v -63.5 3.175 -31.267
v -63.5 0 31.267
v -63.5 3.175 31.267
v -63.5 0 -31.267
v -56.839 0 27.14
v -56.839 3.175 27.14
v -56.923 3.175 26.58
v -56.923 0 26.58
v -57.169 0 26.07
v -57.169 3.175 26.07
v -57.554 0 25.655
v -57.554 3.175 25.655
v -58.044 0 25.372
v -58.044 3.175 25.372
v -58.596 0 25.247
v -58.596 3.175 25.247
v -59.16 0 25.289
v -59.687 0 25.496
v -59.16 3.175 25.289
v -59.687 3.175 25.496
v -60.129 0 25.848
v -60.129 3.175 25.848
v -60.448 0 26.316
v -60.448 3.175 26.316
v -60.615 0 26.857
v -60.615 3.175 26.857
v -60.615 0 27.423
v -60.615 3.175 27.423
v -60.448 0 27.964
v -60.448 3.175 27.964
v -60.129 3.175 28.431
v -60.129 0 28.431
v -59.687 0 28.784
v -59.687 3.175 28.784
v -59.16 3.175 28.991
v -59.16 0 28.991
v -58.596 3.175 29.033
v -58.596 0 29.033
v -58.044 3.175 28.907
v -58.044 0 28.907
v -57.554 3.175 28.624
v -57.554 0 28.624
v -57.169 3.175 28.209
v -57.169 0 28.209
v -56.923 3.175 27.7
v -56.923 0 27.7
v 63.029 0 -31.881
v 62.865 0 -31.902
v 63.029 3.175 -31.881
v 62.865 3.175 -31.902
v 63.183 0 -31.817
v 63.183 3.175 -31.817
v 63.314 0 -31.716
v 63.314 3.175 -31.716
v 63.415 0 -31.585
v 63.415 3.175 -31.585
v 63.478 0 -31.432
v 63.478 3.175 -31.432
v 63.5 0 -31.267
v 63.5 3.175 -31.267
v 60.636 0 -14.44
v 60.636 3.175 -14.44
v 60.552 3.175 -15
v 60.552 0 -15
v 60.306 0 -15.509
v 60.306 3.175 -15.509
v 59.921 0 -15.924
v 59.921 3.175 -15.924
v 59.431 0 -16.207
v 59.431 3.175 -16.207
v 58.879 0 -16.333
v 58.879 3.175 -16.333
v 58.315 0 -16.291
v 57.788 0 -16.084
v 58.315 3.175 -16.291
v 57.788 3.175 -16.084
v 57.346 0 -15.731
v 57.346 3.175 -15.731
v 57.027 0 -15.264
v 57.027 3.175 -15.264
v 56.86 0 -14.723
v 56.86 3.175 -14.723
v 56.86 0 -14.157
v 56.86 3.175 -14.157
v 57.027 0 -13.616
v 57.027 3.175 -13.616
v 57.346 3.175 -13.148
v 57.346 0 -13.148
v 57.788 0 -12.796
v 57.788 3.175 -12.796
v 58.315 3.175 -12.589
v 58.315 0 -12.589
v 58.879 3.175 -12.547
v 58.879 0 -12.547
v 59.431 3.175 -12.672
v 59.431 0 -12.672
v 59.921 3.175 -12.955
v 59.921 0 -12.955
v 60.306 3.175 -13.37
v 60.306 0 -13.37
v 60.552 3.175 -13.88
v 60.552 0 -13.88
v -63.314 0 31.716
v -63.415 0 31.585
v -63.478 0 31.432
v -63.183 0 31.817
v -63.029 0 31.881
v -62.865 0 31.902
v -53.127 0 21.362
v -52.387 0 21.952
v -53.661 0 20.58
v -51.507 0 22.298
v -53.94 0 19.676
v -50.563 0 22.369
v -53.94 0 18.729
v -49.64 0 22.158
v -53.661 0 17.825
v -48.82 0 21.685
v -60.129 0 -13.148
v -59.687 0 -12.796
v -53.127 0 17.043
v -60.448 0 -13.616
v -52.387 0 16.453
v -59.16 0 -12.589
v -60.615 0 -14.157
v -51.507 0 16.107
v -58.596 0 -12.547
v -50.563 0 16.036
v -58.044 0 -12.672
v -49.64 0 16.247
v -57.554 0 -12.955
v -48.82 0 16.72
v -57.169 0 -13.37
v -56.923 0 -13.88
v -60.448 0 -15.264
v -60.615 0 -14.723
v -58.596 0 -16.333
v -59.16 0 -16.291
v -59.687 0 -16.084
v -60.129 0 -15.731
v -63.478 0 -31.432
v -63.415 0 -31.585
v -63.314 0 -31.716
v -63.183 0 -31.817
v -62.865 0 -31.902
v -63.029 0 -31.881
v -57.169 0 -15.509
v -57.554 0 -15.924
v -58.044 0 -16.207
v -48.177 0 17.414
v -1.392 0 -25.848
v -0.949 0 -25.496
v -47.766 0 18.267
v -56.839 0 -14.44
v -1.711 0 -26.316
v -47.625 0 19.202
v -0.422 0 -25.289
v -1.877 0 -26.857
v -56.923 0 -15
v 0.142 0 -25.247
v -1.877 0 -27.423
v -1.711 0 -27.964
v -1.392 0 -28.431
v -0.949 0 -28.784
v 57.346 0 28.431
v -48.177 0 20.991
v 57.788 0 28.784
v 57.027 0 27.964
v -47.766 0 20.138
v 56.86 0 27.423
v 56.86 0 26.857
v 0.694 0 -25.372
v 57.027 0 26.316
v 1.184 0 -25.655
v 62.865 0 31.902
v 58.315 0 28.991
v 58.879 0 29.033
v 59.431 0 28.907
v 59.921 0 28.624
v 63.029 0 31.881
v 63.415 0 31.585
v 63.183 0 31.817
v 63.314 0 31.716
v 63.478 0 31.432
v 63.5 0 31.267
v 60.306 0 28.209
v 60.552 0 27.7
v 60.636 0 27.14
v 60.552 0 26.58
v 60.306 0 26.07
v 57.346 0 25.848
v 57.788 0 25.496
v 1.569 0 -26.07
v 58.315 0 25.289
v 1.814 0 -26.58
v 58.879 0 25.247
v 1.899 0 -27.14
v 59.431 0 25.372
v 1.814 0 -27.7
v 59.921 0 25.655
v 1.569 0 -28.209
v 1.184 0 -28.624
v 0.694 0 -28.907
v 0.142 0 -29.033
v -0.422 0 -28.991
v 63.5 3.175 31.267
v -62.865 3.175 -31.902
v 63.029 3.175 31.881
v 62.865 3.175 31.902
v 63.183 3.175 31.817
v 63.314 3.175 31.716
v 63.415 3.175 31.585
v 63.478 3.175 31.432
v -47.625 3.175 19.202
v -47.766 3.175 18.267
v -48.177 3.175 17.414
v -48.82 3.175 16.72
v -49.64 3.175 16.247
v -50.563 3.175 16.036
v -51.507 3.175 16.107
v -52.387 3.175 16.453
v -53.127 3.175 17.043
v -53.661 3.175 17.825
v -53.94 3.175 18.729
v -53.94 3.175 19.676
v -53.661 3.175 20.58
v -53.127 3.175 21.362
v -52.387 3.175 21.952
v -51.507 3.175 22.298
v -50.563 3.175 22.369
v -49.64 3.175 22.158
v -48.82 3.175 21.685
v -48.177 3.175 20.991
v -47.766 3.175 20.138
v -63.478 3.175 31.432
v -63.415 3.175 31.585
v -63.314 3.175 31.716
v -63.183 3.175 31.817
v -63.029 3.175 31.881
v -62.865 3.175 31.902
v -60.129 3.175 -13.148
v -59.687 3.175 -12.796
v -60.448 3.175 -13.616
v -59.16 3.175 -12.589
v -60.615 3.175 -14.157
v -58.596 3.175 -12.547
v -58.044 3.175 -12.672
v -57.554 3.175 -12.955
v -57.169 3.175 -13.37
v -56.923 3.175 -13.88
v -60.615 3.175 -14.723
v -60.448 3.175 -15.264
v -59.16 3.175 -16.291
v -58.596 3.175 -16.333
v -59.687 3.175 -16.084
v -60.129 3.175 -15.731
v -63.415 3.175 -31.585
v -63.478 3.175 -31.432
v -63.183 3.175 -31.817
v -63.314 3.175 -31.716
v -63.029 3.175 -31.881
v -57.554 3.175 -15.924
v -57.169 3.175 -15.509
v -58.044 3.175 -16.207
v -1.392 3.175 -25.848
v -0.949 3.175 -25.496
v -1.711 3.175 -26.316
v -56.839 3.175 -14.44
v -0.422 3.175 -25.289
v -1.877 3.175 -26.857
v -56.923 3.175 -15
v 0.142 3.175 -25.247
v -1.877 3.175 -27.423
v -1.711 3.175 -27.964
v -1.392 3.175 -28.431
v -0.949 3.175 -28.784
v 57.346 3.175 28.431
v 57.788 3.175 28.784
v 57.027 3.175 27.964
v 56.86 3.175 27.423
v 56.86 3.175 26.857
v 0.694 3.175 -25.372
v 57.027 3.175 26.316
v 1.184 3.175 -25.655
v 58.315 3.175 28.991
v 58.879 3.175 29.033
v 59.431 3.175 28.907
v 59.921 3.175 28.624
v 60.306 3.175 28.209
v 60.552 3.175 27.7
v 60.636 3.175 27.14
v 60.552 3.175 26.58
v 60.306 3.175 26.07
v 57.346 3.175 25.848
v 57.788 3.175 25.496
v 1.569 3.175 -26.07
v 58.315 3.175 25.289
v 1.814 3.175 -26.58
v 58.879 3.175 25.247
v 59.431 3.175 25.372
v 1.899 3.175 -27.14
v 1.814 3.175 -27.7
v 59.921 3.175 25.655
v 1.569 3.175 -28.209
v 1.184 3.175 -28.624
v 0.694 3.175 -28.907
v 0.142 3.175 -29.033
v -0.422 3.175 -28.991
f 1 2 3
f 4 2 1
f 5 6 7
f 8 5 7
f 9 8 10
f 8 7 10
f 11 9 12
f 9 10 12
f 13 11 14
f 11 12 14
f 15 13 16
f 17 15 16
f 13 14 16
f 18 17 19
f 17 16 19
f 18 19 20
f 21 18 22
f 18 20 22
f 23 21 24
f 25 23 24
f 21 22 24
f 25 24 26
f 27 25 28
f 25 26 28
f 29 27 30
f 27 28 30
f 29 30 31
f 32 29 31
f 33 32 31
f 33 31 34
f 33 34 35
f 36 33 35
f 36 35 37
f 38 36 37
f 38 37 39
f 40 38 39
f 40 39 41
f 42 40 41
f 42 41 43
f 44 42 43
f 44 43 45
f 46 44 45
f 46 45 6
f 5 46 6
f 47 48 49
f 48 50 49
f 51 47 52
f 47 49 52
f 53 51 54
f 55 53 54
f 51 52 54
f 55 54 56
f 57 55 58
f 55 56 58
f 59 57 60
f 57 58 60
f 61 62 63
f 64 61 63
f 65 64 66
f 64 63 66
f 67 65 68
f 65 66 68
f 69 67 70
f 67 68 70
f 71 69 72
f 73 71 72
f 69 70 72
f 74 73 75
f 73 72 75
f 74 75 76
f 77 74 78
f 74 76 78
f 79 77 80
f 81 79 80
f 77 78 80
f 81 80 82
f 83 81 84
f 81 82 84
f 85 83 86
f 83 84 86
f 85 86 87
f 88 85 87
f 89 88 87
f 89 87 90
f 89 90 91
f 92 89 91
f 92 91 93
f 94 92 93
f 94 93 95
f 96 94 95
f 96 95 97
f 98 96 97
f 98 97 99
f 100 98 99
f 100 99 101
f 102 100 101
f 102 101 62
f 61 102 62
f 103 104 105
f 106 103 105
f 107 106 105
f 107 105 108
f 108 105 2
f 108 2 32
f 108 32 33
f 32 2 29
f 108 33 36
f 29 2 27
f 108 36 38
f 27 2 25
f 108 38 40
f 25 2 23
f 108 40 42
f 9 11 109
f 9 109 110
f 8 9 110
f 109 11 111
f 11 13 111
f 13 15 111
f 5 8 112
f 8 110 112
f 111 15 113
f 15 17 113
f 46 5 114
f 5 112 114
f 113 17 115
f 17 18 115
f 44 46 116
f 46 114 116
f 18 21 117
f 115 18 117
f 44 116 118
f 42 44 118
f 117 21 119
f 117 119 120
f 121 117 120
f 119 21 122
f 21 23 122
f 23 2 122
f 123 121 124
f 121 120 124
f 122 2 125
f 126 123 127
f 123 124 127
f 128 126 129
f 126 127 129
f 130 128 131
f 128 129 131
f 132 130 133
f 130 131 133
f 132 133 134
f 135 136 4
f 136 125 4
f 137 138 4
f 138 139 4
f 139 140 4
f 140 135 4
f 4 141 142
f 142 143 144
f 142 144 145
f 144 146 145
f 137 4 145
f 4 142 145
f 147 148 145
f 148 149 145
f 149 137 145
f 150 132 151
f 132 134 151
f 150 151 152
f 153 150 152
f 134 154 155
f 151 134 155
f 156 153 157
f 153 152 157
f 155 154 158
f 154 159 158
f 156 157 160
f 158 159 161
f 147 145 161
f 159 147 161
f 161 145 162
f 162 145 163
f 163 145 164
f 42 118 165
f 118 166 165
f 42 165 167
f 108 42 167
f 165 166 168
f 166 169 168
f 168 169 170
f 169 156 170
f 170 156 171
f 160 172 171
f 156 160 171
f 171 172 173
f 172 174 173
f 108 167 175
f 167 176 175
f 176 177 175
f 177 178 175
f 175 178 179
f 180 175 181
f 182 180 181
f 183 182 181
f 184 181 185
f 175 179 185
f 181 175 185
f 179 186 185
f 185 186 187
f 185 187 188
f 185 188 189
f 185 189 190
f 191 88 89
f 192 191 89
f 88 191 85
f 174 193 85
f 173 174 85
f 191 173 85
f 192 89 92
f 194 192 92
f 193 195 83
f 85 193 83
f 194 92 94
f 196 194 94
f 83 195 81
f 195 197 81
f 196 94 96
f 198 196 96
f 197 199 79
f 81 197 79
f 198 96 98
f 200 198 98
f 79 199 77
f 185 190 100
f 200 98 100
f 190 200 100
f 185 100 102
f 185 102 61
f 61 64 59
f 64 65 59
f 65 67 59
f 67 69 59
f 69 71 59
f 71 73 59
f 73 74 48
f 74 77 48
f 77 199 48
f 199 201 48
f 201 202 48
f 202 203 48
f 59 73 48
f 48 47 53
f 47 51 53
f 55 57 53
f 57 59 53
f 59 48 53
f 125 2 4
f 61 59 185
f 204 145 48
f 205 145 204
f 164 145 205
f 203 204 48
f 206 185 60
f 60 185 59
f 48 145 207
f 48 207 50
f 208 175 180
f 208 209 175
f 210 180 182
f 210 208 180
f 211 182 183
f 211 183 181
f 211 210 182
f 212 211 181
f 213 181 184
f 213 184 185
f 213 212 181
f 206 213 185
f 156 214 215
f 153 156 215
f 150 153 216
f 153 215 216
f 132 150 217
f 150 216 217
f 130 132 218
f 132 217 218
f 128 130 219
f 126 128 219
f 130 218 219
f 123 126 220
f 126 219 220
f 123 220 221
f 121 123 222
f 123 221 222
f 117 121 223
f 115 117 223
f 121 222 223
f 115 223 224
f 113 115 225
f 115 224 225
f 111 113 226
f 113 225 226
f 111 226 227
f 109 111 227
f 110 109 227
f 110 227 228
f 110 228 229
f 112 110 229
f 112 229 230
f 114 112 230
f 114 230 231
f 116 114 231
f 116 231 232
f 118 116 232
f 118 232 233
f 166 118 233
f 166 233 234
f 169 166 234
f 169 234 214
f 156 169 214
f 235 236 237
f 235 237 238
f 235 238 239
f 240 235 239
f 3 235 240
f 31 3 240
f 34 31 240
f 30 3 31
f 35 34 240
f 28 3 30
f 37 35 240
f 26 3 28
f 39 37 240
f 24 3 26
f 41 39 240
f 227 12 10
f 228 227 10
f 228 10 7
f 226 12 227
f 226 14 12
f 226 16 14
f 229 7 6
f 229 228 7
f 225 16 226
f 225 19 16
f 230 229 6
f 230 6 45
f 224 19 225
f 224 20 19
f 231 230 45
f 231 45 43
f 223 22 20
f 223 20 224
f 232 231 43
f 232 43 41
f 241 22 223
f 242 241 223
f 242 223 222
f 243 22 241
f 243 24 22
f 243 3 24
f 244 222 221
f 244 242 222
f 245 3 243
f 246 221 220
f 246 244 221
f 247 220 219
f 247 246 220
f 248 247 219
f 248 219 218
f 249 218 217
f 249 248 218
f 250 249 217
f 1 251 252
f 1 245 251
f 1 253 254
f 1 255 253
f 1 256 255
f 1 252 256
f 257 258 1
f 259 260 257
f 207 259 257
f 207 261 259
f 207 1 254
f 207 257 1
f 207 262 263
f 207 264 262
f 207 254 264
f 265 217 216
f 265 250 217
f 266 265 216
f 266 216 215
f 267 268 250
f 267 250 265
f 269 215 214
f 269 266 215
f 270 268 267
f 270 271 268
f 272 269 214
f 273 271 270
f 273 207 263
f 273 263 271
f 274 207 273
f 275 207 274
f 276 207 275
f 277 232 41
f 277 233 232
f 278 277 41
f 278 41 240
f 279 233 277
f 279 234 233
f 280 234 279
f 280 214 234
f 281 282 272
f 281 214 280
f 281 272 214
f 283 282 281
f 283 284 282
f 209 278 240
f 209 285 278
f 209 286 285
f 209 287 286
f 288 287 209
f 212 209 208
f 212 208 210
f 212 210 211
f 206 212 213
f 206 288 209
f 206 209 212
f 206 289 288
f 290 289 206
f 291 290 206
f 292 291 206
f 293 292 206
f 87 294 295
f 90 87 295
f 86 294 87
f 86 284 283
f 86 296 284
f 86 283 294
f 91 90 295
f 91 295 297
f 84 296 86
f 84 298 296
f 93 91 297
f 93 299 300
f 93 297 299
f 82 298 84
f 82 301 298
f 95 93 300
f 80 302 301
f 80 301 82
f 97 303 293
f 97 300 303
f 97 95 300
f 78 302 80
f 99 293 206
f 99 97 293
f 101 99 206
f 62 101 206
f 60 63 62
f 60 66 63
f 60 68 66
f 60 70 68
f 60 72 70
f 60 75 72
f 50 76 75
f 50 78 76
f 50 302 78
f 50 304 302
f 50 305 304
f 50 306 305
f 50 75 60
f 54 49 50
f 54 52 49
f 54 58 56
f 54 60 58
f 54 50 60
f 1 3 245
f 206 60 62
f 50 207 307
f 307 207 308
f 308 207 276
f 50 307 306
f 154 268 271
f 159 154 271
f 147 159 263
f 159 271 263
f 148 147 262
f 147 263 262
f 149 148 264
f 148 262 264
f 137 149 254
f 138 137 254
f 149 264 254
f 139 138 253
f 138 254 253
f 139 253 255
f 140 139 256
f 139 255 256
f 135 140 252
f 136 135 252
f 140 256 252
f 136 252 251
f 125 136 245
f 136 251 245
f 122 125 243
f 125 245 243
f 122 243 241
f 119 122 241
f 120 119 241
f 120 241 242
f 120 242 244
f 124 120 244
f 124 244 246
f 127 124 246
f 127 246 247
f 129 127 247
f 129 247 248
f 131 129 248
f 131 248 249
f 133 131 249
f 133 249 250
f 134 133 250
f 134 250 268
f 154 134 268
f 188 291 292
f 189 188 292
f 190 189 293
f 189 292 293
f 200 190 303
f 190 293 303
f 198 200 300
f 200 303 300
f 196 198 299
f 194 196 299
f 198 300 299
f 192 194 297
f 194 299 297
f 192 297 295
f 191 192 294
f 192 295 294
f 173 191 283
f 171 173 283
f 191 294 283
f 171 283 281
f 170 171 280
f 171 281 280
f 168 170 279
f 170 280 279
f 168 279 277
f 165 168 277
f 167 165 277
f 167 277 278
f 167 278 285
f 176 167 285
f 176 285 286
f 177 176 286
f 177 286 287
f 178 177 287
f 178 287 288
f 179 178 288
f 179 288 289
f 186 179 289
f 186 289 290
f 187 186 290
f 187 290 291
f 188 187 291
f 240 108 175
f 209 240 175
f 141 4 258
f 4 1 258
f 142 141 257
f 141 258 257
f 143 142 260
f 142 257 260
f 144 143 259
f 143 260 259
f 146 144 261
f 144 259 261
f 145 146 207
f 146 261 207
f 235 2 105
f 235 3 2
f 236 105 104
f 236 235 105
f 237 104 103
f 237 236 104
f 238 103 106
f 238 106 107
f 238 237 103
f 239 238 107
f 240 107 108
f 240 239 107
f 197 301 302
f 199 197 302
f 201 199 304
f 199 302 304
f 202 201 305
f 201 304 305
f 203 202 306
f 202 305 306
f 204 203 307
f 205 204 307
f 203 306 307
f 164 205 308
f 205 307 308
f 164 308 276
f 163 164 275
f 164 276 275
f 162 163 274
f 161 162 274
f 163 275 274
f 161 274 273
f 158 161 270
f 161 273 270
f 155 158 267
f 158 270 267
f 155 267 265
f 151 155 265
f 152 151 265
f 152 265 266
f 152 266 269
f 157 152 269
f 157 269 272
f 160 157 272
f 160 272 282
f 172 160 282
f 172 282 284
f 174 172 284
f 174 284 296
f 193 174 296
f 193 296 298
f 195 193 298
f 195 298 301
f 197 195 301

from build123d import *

# Parameters (mm, degrees)
SKETCH1_W           = 127
SKETCH1_H           = 63.8048
BOSS_EXTRUDE1_DEPTH = 3.175
SKETCH4_R           = 1.89865
CUT_EXTRUDE3_DEPTH  = 4.175
SKETCH5_R           = 3.175
CUT_EXTRUDE4_DEPTH  = 4.175
FILLET2_R           = 0.635


with BuildPart() as part:
    # Sketch1 → Boss-Extrude1 (new body)
    with BuildSketch(Plane(origin=(0, 0, 0), x_dir=(1, 0, 0), z_dir=(0, 1, 0))):
        Rectangle(SKETCH1_W, SKETCH1_H)
    extrude(amount=BOSS_EXTRUDE1_DEPTH)

    # Sketch4 → Cut-Extrude3 (cut, through all)
    with BuildSketch(Plane(origin=(0, 3.175, 0), x_dir=(1, 0, 0), z_dir=(0, 1, 0))):
        with Locations((-58.7375, -27.1399)):
            Circle(SKETCH4_R)
        with Locations((-58.7375, 14.4399)):
            Circle(SKETCH4_R)
        with Locations((58.7375, 14.4399)):
            Circle(SKETCH4_R)
        with Locations((58.7375, -27.1399)):
            Circle(SKETCH4_R)
        with Locations((0, 27.1399)):
            Circle(SKETCH4_R)
    extrude(amount=-CUT_EXTRUDE3_DEPTH, mode=Mode.SUBTRACT)

    # Sketch5 → Cut-Extrude4 (cut, through all)
    with BuildSketch(Plane(origin=(0, 3.175, 0), x_dir=(1, 0, 0), z_dir=(0, 1, 0))):
        with Locations((-50.8, -19.2024)):
            Circle(SKETCH5_R)
    extrude(amount=-CUT_EXTRUDE4_DEPTH, mode=Mode.SUBTRACT)

    # Fillet2
    fillet2_edges = [part.edges().sort_by_distance(p)[0] for p in [
        (63.5, 1.5875, 31.9024),
        (-63.5, 1.5875, 31.9024),
        (-63.5, 1.5875, -31.9024),
        (63.5, 1.5875, -31.9024),
    ]]
    fillet(fillet2_edges, radius=FILLET2_R)


solid = part.part
